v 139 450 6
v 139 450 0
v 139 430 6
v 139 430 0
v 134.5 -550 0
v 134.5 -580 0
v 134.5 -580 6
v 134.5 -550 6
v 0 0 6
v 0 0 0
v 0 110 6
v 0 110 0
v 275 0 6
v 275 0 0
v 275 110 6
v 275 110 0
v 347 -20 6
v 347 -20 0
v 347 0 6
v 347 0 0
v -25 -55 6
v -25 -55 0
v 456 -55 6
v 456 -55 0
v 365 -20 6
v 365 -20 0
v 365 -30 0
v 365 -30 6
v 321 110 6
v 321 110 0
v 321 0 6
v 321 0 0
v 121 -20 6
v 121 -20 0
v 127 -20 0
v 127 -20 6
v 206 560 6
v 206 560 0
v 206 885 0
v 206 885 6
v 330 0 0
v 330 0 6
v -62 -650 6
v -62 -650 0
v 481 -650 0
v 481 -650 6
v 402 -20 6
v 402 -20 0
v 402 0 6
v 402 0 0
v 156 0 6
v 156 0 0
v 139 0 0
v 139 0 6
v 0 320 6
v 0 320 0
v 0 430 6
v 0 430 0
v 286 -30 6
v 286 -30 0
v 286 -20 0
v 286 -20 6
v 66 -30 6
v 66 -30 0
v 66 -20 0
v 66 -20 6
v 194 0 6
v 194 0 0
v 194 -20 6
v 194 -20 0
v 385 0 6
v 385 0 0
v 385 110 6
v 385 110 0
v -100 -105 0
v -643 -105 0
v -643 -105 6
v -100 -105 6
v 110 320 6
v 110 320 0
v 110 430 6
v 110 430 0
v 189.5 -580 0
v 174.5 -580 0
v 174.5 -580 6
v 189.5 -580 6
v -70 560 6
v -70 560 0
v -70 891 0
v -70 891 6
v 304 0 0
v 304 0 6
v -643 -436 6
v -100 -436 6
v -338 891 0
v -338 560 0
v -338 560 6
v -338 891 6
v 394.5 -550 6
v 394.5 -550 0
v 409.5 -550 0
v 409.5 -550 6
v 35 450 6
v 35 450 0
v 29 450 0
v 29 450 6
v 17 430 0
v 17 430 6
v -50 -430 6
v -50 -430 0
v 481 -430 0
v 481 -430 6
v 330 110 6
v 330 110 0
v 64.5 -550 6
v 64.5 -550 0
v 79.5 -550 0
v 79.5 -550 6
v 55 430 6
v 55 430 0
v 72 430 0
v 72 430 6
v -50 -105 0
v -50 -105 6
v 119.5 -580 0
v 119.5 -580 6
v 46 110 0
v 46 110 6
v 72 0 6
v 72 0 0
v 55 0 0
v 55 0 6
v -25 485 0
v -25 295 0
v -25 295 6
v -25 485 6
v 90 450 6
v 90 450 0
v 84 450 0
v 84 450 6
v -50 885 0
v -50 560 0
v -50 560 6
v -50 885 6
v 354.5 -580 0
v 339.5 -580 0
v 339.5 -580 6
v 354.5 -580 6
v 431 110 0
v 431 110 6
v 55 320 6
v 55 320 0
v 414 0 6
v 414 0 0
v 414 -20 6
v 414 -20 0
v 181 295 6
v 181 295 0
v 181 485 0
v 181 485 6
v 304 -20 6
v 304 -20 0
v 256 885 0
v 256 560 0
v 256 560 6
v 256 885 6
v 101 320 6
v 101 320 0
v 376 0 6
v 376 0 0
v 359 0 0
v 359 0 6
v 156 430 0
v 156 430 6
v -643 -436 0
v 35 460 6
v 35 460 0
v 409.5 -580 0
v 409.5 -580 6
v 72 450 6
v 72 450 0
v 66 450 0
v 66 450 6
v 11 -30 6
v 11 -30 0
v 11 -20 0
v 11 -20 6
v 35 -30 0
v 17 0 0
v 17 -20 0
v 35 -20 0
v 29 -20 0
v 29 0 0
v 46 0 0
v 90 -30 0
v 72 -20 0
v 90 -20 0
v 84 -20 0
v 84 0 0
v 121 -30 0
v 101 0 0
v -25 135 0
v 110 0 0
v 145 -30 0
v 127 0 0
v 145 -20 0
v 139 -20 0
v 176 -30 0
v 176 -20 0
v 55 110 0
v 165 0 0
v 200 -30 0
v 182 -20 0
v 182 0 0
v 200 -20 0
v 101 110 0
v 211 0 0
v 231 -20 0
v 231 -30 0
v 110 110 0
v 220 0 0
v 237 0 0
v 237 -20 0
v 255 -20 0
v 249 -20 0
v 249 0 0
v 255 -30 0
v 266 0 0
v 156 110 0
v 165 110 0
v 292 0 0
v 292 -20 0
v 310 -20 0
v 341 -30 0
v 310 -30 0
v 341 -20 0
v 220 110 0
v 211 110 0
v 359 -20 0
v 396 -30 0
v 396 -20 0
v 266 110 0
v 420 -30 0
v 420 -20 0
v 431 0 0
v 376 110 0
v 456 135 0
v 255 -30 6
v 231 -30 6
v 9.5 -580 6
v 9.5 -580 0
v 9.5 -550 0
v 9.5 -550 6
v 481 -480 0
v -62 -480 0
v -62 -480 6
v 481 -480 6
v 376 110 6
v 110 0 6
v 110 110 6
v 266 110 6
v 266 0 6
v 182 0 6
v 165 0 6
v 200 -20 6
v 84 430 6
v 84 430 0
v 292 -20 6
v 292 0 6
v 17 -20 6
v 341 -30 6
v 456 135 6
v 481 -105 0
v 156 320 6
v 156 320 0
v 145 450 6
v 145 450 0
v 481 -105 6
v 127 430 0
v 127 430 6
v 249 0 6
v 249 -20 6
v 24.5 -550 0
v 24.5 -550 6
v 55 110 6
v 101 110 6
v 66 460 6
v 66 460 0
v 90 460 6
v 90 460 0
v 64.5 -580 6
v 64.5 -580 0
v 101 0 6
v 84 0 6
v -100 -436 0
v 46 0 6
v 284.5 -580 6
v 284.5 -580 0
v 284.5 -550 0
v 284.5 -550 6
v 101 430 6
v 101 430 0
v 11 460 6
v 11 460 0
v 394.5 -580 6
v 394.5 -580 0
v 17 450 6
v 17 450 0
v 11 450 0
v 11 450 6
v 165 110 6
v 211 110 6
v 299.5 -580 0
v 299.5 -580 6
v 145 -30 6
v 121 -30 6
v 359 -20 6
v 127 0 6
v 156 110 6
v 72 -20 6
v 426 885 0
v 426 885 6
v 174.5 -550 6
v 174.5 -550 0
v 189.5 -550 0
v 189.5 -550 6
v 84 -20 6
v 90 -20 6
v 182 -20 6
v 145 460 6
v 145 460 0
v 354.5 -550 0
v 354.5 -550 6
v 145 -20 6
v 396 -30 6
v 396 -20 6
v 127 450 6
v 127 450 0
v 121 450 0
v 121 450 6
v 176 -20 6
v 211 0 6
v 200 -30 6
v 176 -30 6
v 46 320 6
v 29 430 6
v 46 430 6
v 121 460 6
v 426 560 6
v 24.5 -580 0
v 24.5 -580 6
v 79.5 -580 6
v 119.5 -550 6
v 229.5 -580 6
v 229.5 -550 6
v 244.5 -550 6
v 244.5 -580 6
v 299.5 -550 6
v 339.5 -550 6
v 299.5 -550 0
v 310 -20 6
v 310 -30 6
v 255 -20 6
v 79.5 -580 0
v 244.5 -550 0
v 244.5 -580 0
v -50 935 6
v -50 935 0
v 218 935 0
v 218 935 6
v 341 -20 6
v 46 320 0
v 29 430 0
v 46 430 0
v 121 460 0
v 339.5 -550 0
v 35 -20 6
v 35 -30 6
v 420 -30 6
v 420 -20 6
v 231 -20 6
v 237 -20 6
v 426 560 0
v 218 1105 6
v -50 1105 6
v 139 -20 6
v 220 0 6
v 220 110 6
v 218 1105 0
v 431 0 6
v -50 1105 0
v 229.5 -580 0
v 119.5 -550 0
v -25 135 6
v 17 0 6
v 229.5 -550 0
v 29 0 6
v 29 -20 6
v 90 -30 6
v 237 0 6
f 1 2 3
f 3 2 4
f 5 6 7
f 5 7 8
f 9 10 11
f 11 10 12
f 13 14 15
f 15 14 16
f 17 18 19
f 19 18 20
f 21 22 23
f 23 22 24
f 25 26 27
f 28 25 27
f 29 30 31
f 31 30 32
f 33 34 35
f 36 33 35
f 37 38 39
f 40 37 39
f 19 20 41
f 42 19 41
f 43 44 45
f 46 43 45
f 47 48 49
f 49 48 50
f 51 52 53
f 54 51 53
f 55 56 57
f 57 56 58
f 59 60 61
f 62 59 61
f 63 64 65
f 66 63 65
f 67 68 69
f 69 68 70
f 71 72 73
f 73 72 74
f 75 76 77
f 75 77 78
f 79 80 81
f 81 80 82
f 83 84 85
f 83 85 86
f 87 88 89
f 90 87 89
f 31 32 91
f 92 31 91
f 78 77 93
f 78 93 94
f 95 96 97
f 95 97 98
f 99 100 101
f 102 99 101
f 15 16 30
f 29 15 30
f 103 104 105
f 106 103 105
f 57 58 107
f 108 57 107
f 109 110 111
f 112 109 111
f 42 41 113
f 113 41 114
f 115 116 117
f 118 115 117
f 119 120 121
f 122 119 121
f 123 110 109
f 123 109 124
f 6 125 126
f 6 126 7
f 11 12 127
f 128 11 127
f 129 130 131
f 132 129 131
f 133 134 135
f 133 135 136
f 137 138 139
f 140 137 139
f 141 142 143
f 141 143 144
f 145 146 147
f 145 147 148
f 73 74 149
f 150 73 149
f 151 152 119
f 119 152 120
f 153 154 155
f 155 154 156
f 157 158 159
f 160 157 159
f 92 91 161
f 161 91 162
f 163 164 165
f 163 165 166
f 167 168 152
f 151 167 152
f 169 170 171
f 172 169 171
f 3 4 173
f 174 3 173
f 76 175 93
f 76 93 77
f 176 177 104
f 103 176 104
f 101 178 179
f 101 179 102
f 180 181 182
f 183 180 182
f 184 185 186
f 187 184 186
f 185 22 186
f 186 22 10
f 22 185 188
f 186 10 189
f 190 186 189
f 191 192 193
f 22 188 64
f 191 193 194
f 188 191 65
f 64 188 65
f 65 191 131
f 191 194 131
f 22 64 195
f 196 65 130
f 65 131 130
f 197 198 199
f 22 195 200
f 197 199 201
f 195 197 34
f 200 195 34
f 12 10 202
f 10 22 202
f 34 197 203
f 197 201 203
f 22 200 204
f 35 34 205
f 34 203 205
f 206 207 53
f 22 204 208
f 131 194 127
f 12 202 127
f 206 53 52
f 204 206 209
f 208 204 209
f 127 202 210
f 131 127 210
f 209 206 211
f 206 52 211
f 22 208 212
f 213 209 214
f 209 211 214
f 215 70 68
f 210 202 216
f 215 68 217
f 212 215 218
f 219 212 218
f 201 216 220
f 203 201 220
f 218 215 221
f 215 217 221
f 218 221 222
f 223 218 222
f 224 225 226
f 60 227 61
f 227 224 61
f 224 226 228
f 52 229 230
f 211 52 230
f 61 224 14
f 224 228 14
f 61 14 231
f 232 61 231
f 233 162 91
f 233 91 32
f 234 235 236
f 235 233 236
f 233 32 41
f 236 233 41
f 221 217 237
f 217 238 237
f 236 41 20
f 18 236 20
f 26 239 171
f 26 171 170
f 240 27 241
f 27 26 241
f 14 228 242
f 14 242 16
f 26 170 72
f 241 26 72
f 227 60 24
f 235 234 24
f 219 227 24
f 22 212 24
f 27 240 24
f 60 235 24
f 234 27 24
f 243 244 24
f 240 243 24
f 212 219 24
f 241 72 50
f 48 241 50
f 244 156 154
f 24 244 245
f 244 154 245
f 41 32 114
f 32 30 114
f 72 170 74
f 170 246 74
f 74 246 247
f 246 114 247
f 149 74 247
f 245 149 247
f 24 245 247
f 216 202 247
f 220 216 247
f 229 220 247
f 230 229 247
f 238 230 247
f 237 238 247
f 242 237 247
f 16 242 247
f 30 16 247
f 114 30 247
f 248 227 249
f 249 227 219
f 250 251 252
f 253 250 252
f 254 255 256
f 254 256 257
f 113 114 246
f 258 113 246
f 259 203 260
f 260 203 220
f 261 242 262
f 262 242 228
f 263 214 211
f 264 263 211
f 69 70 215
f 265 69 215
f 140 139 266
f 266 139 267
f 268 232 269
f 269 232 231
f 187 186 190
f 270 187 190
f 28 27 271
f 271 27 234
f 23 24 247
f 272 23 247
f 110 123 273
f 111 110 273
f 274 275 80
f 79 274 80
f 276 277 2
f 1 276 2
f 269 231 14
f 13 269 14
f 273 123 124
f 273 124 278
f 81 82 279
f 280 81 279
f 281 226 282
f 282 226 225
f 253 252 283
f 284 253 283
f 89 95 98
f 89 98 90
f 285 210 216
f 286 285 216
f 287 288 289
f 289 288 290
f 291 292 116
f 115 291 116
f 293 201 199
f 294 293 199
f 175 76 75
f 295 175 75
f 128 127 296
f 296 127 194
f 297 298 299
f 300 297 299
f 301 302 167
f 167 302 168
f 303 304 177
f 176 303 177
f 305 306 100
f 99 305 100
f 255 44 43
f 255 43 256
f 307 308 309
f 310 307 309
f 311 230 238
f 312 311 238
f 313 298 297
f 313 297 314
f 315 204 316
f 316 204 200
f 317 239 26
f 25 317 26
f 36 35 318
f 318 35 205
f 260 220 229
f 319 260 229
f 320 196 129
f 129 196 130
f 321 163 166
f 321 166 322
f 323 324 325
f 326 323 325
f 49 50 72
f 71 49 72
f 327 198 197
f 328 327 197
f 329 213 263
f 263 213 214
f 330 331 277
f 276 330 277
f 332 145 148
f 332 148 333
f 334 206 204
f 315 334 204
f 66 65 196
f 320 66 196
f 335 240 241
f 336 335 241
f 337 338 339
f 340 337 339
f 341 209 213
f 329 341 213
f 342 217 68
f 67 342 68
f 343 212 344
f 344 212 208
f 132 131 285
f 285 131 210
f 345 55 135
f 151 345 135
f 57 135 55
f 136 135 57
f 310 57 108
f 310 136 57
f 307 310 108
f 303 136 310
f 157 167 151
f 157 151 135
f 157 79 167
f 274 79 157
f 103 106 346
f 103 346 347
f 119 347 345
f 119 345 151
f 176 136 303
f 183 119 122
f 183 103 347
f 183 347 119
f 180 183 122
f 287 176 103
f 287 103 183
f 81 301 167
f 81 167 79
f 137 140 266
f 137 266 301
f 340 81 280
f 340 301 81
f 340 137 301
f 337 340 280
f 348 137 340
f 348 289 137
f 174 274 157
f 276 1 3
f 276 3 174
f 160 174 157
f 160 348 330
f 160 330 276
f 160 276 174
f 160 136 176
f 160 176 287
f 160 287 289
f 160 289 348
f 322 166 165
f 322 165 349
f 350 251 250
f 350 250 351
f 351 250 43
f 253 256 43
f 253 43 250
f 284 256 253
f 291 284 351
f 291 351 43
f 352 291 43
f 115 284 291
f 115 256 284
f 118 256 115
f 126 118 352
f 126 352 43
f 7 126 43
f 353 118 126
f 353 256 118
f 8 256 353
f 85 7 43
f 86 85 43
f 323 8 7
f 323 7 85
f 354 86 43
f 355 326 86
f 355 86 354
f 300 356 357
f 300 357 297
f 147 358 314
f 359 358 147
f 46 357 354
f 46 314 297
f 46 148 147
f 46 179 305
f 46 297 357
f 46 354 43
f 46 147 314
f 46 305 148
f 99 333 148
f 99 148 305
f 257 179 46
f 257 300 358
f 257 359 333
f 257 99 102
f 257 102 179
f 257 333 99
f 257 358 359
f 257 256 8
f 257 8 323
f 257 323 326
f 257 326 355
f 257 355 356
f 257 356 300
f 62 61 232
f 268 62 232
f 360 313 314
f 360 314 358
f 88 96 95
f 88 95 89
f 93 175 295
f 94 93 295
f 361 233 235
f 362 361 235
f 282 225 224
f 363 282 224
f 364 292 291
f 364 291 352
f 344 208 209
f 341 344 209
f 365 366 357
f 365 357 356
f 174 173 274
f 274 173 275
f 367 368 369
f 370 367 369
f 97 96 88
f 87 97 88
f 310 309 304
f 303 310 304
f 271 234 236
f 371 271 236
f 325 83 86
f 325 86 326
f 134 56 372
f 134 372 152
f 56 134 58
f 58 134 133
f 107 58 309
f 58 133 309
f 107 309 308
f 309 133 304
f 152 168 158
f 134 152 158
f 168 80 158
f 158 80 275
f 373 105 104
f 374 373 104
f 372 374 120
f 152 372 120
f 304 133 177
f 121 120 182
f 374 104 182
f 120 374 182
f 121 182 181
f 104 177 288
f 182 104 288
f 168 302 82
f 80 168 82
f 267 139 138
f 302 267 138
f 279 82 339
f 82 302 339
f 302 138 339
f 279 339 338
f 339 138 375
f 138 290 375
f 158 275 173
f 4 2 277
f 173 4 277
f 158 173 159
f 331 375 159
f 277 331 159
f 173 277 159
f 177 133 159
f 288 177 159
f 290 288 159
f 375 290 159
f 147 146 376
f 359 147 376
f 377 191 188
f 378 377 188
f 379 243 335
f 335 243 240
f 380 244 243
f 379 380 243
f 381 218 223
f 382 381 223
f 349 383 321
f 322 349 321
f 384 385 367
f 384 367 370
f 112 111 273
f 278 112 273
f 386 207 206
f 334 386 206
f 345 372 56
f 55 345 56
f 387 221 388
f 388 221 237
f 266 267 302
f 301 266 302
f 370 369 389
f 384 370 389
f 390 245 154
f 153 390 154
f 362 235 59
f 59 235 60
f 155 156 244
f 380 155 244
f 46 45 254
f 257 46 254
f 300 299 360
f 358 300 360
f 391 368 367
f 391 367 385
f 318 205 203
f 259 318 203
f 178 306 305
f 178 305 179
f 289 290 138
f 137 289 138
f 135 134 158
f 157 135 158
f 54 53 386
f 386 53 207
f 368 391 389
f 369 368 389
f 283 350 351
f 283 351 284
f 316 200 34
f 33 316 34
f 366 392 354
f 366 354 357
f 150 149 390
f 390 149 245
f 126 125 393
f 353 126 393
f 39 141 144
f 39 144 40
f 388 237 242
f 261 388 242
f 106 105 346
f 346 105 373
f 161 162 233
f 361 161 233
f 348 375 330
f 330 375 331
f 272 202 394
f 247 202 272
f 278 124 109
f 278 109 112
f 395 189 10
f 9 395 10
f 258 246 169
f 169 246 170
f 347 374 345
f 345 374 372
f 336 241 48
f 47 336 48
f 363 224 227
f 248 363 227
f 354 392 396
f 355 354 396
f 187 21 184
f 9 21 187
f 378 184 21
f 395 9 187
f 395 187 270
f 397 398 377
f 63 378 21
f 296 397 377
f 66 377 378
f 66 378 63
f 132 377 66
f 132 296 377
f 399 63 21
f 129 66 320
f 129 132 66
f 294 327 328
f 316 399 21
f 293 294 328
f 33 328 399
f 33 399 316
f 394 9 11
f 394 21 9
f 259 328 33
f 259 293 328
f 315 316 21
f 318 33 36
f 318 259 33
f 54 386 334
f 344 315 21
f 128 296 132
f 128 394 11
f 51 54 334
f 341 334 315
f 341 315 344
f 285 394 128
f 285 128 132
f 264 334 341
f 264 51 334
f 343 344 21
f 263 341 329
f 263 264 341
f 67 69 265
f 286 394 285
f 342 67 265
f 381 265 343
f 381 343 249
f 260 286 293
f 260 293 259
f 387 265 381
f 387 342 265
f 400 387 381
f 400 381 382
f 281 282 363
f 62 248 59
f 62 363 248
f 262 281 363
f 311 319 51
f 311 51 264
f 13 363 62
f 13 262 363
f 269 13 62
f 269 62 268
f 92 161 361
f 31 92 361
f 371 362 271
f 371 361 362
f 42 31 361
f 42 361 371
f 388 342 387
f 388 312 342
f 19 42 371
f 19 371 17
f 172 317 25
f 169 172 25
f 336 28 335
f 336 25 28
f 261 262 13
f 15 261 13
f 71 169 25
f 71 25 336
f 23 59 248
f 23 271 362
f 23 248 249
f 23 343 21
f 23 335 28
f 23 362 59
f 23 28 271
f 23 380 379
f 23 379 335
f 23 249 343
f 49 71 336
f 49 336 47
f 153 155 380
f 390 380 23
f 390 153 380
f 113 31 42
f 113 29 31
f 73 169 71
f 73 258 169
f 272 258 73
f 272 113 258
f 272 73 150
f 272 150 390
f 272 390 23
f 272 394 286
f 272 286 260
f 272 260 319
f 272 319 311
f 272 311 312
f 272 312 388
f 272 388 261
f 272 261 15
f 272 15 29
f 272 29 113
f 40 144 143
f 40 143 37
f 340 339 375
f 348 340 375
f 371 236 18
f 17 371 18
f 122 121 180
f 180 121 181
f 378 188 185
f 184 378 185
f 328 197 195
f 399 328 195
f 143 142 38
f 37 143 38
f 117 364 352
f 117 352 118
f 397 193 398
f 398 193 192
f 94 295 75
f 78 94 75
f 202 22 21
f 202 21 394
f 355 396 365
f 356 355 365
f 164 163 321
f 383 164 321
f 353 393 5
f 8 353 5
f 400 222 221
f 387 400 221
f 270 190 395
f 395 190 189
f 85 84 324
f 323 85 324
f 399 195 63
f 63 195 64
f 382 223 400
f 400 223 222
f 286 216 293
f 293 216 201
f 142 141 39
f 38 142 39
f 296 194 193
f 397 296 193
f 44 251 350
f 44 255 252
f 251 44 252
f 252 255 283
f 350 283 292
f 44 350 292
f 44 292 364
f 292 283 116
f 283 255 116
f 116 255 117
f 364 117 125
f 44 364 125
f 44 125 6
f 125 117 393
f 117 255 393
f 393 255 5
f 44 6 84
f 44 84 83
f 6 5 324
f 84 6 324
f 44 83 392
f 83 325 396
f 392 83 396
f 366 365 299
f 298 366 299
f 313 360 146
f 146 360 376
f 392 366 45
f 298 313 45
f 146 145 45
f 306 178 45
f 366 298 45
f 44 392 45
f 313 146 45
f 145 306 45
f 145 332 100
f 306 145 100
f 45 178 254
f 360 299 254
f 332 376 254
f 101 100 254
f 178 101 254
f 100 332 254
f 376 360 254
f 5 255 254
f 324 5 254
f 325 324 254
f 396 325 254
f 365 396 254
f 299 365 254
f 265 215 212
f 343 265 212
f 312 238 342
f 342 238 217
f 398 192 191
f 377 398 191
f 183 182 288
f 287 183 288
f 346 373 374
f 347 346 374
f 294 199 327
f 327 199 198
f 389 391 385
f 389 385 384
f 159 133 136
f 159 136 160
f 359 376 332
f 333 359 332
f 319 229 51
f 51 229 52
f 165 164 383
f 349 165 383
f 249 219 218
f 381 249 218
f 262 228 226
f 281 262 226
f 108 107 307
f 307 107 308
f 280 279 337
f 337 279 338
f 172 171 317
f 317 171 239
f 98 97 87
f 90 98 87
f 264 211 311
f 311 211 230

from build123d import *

# Parameters (mm, degrees)
F0_W     = 481
F0_H     = 190
F1_DEPTH = 6
F0_W_2   = 206
F0_W_3   = 531
F0_H_2   = 325
F2_DEPTH = 6
F0_W_4   = 256
F0_W_5   = 170
F0_W_6   = 268
F0_H_3   = 170
F0_H_4   = 331
F0_W_7   = 543
F0_W_8   = 15
F0_H_5   = 30


# Not quite as in the source:
# - a feature names something its author has since deleted; it is built from what else it names


with BuildPart() as f1:
    # F0 (on Top) → F1 (new body)
    with BuildSketch(Plane.XY):
        with Locations((215.5, 40)):
            Rectangle(F0_W, F0_H)
        Polygon((17, 0), (0, 0), (0, 110), (46, 110), (46, 0), (29, 0), (29, -20), (35, -20), (35, -30), (29, -30), (17, -30), (11, -30), (11, -20), (17, -20), align=None, mode=Mode.SUBTRACT)
        Polygon((101, 110), (101, 0), (84, 0), (84, -20), (90, -20), (90, -30), (84, -30), (72, -30), (66, -30), (66, -20), (72, -20), (72, 0), (55, 0), (55, 110), align=None, mode=Mode.SUBTRACT)
        Polygon((156, 110), (156, 0), (139, 0), (139, -20), (145, -20), (145, -30), (139, -30), (127, -30), (121, -30), (121, -20), (127, -20), (127, 0), (110, 0), (110, 110), align=None, mode=Mode.SUBTRACT)
        Polygon((211, 110), (211, 0), (194, 0), (194, -20), (200, -20), (200, -30), (194, -30), (182, -30), (176, -30), (176, -20), (182, -20), (182, 0), (165, 0), (165, 110), align=None, mode=Mode.SUBTRACT)
        Polygon((266, 110), (266, 0), (249, 0), (249, -20), (255, -20), (255, -30), (249, -30), (237, -30), (231, -30), (231, -20), (237, -20), (237, 0), (220, 0), (220, 110), align=None, mode=Mode.SUBTRACT)
        Polygon((321, 110), (321, 0), (304, 0), (304, -20), (310, -20), (310, -30), (304, -30), (292, -30), (286, -30), (286, -20), (292, -20), (292, 0), (275, 0), (275, 110), align=None, mode=Mode.SUBTRACT)
        Polygon((376, 110), (376, 0), (359, 0), (359, -20), (365, -20), (365, -30), (359, -30), (347, -30), (341, -30), (341, -20), (347, -20), (347, 0), (330, 0), (330, 110), align=None, mode=Mode.SUBTRACT)
        Polygon((431, 110), (431, 0), (414, 0), (414, -20), (420, -20), (420, -30), (414, -30), (402, -30), (396, -30), (396, -20), (402, -20), (402, 0), (385, 0), (385, 110), align=None, mode=Mode.SUBTRACT)
    extrude(amount=F1_DEPTH)


with BuildPart() as f1b:
    # F0 (on Top) → F1, piece 2 (new body)
    with BuildSketch(Plane.XY):
        with Locations((78, 390)):
            Rectangle(F0_W_2, F0_H)
        Polygon((17, 430), (17, 450), (11, 450), (11, 460), (17, 460), (29, 460), (35, 460), (35, 450), (29, 450), (29, 430), (46, 430), (46, 320), (0, 320), (0, 430), align=None, mode=Mode.SUBTRACT)
        Polygon((72, 460), (84, 460), (90, 460), (90, 450), (84, 450), (84, 430), (101, 430), (101, 320), (55, 320), (55, 430), (72, 430), (72, 450), (66, 450), (66, 460), align=None, mode=Mode.SUBTRACT)
        Polygon((127, 460), (139, 460), (145, 460), (145, 450), (139, 450), (139, 430), (156, 430), (156, 320), (110, 320), (110, 430), (127, 430), (127, 450), (121, 450), (121, 460), align=None, mode=Mode.SUBTRACT)
    extrude(amount=F1_DEPTH)


with BuildPart() as f2:
    # F0 (on Top) → F2 (new body)
    with BuildSketch(Plane.XY):
        with Locations((215.5, -267.5)):
            Rectangle(F0_W_3, F0_H_2)
    extrude(amount=F2_DEPTH)


with BuildPart() as f2b:
    # F0 (on Top) → F2, piece 2 (new body)
    with BuildSketch(Plane.XY):
        with Locations((78, 722.5)):
            Rectangle(F0_W_4, F0_H_2)
    extrude(amount=F2_DEPTH)


with BuildPart() as f2c:
    # F0 (on Top) → F2, piece 3 (new body)
    with BuildSketch(Plane.XY):
        with Locations((341, 722.5)):
            Rectangle(F0_W_5, F0_H_2)
    extrude(amount=F2_DEPTH)


with BuildPart() as f2d:
    # F0 (on Top) → F2, piece 4 (new body)
    with BuildSketch(Plane.XY):
        with Locations((84, 1020)):
            Rectangle(F0_W_6, F0_H_3)
    extrude(amount=F2_DEPTH)


with BuildPart() as f2e:
    # F0 (on Top) → F2, piece 5 (new body)
    with BuildSketch(Plane.XY):
        with Locations((-204, 725.5)):
            Rectangle(F0_W_6, F0_H_4)
    extrude(amount=F2_DEPTH)


with BuildPart() as f2f:
    # F0 (on Top) → F2, piece 6 (new body)
    with BuildSketch(Plane.XY):
        with Locations((209.5, -565)):
            Rectangle(F0_W_7, F0_H_3)
        with Locations((17, -565)):
            Rectangle(F0_W_8, F0_H_5, mode=Mode.SUBTRACT)
        with Locations((72, -565)):
            Rectangle(F0_W_8, F0_H_5, mode=Mode.SUBTRACT)
        with Locations((127, -565)):
            Rectangle(F0_W_8, F0_H_5, mode=Mode.SUBTRACT)
        with Locations((182, -565)):
            Rectangle(F0_W_8, F0_H_5, mode=Mode.SUBTRACT)
        with Locations((237, -565)):
            Rectangle(F0_W_8, F0_H_5, mode=Mode.SUBTRACT)
        with Locations((292, -565)):
            Rectangle(F0_W_8, F0_H_5, mode=Mode.SUBTRACT)
        with Locations((347, -565)):
            Rectangle(F0_W_8, F0_H_5, mode=Mode.SUBTRACT)
        with Locations((402, -565)):
            Rectangle(F0_W_8, F0_H_5, mode=Mode.SUBTRACT)
    extrude(amount=F2_DEPTH)


with BuildPart() as f2g:
    # F0 (on Top) → F2, piece 7 (new body)
    with BuildSketch(Plane.XY):
        with Locations((-371.5, -270.5)):
            Rectangle(F0_W_7, F0_H_4)
    extrude(amount=F2_DEPTH)


solid = Compound([f1.part, f1b.part, f2.part, f2b.part, f2c.part, f2d.part, f2e.part, f2f.part, f2g.part])
